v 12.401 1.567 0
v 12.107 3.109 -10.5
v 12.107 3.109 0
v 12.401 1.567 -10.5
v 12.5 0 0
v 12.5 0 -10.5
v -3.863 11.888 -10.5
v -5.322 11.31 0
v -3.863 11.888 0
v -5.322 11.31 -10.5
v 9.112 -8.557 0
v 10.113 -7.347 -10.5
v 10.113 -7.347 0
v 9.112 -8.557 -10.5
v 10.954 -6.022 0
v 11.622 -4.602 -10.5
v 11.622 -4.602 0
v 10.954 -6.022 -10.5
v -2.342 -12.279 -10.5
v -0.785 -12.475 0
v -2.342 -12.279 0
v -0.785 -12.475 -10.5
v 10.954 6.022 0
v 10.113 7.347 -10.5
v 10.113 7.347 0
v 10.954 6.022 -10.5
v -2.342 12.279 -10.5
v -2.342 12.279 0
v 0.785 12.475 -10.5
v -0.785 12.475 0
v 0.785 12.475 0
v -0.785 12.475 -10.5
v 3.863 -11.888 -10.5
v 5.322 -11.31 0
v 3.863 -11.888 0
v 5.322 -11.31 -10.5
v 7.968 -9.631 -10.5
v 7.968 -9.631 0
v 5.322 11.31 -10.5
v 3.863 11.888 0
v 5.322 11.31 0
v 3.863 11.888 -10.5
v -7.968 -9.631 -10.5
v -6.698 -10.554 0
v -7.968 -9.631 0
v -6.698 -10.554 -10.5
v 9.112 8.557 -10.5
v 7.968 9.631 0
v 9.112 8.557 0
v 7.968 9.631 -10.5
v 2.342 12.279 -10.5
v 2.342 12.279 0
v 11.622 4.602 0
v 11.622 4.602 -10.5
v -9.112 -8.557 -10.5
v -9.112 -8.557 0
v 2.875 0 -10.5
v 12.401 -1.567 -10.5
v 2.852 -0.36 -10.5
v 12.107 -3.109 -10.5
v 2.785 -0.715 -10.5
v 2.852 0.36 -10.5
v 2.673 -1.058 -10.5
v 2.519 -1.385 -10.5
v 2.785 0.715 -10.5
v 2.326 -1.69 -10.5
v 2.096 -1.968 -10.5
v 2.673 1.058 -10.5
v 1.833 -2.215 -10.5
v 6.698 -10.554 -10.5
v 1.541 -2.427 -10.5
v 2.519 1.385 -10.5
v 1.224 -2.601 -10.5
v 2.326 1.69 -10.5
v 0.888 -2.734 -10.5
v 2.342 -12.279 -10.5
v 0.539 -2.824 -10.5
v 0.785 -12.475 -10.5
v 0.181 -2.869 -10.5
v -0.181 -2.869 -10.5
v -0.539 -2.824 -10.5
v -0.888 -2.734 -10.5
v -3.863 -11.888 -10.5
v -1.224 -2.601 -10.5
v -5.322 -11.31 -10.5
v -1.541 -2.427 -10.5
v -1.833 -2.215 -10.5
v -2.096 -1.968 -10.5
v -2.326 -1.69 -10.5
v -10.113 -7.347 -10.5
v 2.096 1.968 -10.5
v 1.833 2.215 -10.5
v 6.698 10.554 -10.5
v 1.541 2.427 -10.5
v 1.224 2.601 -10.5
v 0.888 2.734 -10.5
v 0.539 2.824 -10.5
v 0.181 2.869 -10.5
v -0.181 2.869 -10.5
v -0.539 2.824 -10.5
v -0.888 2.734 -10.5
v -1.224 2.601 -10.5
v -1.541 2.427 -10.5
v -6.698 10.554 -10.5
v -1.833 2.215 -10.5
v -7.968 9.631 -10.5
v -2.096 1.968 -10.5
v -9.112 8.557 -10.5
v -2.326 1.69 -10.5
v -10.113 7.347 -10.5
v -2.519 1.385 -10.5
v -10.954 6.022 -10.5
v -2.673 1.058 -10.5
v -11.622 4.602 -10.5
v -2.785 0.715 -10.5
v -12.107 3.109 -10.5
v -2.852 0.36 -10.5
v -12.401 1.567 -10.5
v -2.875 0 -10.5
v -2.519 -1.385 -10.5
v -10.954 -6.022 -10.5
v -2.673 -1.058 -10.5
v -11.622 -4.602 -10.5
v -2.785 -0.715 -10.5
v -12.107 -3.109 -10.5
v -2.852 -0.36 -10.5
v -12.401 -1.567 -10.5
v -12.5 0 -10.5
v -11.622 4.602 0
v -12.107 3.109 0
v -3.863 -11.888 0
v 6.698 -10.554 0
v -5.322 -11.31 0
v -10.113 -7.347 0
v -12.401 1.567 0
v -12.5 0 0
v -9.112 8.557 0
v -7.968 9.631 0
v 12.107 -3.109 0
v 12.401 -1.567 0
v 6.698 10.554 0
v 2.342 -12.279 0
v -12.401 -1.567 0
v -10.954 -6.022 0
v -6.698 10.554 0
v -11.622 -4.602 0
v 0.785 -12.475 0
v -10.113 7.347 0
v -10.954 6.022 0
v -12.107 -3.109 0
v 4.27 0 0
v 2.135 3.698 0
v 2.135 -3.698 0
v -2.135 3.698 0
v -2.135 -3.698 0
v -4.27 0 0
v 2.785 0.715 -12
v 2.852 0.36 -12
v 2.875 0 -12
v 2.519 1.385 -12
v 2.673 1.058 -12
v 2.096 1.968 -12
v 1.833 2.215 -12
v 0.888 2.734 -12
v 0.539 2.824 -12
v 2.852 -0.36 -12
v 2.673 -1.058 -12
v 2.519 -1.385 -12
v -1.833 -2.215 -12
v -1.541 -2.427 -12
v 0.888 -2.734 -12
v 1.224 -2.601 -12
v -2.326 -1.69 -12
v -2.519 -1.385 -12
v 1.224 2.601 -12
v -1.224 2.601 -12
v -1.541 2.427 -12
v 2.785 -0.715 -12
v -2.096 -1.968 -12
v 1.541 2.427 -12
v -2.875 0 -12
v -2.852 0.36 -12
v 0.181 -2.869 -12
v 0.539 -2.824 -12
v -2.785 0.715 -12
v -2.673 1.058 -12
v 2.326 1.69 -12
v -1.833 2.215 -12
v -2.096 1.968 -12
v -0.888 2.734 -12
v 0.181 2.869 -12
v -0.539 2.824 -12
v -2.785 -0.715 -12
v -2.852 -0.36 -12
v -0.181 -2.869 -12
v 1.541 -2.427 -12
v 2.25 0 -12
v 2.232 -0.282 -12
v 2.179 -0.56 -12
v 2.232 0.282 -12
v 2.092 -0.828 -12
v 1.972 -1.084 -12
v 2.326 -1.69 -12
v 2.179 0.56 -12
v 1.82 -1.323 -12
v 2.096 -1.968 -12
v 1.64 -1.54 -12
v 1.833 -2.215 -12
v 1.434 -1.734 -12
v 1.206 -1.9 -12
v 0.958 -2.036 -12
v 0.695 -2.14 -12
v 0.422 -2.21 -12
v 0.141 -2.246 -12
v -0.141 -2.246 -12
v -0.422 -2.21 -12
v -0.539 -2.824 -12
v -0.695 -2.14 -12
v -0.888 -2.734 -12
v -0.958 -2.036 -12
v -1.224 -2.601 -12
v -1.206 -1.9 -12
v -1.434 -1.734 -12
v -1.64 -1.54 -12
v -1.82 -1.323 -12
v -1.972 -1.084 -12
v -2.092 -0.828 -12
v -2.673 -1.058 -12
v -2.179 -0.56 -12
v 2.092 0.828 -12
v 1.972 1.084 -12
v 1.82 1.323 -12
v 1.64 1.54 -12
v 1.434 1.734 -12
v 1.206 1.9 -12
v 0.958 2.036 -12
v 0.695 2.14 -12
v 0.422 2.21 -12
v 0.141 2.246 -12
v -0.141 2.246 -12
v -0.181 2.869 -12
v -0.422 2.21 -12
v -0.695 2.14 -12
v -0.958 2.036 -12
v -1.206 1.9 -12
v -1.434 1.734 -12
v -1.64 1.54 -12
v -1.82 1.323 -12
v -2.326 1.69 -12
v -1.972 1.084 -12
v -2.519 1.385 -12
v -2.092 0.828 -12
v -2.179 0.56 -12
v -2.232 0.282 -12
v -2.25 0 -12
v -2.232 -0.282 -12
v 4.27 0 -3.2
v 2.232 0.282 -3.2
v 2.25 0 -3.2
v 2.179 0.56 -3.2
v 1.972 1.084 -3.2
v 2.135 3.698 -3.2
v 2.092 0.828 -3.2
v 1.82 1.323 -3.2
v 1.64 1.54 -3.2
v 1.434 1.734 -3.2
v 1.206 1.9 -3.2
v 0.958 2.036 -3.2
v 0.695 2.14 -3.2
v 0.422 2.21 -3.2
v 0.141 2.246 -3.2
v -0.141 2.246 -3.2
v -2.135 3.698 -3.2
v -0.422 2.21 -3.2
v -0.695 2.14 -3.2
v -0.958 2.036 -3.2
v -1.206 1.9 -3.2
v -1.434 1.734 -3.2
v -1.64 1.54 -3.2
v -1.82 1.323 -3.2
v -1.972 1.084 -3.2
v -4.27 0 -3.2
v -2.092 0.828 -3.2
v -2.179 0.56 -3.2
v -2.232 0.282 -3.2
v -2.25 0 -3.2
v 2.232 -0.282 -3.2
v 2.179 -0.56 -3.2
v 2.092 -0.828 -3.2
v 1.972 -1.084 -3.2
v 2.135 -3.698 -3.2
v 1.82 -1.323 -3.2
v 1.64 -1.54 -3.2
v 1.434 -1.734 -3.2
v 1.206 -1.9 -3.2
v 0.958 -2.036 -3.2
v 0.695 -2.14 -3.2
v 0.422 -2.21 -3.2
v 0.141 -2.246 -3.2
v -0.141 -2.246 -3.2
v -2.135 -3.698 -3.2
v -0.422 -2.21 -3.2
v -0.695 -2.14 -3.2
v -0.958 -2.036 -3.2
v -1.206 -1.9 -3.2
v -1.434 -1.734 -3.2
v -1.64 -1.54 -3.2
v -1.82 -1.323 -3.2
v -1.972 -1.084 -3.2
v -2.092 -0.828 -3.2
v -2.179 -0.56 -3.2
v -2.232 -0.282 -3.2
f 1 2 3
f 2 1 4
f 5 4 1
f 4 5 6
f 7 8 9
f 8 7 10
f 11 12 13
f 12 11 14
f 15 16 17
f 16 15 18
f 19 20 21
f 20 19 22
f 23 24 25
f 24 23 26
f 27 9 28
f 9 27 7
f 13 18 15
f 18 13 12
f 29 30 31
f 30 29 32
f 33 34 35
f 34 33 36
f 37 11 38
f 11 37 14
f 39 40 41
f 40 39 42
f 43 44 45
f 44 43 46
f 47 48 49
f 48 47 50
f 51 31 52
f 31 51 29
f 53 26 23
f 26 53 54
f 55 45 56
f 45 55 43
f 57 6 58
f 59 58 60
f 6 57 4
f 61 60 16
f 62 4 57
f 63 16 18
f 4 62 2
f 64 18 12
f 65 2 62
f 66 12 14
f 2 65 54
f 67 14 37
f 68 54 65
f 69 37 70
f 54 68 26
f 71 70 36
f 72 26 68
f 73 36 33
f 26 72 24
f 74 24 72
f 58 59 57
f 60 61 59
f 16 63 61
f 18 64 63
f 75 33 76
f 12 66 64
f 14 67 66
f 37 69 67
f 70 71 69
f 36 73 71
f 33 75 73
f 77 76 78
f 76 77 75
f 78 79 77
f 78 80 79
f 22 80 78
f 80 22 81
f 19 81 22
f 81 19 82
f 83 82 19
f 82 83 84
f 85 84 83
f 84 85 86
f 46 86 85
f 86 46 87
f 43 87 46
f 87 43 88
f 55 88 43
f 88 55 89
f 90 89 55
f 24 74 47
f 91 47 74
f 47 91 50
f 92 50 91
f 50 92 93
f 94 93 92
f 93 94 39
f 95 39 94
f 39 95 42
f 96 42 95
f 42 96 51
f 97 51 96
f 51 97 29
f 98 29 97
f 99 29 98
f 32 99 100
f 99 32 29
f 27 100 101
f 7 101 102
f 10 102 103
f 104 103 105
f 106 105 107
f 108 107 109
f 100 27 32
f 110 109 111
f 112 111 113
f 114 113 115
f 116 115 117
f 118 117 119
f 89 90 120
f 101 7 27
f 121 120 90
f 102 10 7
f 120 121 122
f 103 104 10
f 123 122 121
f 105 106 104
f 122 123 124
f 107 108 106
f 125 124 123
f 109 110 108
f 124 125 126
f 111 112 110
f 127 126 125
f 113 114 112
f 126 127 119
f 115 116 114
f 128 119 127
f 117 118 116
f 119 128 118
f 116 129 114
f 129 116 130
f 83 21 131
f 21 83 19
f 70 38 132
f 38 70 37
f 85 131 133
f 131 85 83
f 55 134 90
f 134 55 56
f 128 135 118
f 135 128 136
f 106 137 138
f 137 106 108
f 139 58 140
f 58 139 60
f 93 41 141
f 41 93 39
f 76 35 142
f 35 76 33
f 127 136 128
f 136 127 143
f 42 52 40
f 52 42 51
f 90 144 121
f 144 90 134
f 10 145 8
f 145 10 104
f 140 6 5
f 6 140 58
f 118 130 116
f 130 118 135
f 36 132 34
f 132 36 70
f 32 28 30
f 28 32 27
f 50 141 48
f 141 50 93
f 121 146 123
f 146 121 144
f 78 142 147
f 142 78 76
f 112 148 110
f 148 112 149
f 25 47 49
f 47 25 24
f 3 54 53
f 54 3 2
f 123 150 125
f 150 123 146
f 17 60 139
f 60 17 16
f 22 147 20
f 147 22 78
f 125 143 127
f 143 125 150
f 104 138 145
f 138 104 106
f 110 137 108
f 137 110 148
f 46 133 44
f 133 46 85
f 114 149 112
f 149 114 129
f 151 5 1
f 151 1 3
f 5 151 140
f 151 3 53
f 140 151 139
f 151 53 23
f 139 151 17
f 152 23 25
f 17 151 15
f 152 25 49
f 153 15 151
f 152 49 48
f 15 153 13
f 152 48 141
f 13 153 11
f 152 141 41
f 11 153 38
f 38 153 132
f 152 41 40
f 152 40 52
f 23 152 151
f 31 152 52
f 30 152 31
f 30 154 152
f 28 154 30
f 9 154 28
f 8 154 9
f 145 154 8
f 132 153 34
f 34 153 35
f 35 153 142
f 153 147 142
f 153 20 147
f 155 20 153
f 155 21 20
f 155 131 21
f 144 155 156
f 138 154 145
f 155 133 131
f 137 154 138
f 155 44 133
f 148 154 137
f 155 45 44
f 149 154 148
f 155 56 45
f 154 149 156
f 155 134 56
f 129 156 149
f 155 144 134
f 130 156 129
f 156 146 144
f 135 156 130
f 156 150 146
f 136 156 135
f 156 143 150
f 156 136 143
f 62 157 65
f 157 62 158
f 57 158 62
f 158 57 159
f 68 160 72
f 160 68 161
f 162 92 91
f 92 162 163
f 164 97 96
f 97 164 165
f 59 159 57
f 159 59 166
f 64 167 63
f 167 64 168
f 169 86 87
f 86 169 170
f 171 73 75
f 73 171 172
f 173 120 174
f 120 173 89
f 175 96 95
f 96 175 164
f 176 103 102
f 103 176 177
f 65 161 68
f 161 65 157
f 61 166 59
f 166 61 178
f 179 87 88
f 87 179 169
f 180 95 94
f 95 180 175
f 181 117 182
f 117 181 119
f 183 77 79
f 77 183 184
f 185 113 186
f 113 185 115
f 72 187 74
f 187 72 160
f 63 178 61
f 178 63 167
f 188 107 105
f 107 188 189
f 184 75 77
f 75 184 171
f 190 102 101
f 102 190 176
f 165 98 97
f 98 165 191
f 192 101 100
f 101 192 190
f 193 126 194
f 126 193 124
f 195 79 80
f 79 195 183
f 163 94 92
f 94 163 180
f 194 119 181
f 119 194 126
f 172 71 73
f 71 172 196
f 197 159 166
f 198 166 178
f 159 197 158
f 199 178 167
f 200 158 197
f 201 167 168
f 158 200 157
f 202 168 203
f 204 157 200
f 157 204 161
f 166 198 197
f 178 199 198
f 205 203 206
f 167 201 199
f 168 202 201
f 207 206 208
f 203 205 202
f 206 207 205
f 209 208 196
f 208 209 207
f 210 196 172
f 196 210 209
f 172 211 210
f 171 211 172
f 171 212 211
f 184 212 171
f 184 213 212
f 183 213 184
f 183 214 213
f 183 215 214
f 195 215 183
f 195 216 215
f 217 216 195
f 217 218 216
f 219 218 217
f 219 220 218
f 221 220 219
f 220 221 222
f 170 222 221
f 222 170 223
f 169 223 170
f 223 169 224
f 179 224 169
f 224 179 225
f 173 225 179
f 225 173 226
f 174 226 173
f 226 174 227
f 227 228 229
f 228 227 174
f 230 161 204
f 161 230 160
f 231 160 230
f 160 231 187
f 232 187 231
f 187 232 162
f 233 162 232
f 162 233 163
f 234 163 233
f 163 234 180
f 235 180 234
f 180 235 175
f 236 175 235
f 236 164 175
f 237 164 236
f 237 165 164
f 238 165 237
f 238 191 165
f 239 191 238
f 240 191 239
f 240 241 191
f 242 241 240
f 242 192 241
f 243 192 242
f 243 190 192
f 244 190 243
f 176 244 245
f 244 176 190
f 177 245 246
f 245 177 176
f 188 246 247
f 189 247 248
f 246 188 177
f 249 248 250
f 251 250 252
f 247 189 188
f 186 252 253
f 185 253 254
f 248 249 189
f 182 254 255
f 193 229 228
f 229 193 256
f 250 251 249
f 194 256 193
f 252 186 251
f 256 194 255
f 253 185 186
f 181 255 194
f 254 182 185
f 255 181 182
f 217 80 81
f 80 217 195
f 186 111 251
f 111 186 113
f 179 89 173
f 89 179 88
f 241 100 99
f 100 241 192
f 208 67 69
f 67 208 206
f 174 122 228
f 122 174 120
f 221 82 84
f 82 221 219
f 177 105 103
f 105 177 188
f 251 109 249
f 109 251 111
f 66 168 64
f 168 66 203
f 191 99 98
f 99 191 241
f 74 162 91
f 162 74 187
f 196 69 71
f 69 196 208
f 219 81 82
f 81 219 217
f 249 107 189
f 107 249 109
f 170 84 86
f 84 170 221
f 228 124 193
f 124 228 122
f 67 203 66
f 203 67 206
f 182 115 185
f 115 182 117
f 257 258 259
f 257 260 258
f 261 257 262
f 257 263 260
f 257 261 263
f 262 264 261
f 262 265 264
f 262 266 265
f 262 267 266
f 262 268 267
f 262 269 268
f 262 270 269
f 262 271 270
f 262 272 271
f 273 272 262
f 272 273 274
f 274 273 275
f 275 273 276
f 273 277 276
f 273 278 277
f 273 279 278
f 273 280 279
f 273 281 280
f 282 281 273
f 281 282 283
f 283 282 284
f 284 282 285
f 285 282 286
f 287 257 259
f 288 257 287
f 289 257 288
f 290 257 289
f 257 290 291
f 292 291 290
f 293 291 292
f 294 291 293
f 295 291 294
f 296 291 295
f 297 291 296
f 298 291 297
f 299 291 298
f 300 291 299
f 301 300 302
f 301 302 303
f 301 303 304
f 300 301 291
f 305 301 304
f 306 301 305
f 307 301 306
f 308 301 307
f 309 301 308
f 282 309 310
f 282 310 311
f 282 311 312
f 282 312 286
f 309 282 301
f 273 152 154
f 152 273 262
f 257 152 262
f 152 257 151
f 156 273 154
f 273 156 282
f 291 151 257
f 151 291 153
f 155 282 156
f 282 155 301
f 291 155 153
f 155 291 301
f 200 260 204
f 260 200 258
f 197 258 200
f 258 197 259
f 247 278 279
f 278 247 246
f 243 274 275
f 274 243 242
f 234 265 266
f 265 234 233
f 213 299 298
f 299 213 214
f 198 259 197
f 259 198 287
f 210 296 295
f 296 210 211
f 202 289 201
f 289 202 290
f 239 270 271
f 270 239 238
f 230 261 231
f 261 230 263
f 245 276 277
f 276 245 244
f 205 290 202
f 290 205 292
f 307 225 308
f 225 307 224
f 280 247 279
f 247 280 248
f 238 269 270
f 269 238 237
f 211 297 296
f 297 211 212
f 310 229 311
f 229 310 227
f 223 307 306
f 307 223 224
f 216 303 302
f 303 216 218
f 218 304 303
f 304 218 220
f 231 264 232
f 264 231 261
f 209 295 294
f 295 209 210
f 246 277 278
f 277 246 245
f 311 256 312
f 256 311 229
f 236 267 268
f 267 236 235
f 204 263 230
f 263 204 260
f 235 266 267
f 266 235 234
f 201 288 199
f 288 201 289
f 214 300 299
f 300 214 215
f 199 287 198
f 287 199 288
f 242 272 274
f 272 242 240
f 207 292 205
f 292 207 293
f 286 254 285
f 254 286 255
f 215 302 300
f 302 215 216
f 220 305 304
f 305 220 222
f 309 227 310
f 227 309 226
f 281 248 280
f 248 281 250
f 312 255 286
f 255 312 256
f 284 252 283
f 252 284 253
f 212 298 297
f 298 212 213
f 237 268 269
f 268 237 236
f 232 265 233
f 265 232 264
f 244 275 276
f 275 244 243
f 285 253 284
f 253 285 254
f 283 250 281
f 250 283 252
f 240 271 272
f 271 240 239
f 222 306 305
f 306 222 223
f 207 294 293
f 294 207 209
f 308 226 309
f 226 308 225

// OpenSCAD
$fn = 50;


difference() {
	union() {
		translate(v = [0, 0, -10.5000000000]) {
			cylinder(h = 10.5000000000, r = 12.5000000000);
		}
		#translate(v = [0, 0, -12.0000000000]) {
			cylinder(h = 12, r = 2.8750000000);
		}
	}
	union() {
		translate(v = [0, 0, 0]) {
			rotate(a = [0, 0, 0]) {
				difference() {
					union() {
						translate(v = [0, 0, -3.2000000000]) {
							linear_extrude(height = 3.2000000000) {
								polygon(points = [[4.2698000000, 0.0000000000], [2.1349000000, 3.6977552691], [-2.1349000000, 3.6977552691], [-4.2698000000, 0.0000000000], [-2.1349000000, -3.6977552691], [2.1349000000, -3.6977552691]]);
							}
						}
					}
					union();
				}
			}
		}
		#translate(v = [0, 0, -100.0000000000]) {
			cylinder(h = 200, r = 2.2500000000);
		}
	}
}
